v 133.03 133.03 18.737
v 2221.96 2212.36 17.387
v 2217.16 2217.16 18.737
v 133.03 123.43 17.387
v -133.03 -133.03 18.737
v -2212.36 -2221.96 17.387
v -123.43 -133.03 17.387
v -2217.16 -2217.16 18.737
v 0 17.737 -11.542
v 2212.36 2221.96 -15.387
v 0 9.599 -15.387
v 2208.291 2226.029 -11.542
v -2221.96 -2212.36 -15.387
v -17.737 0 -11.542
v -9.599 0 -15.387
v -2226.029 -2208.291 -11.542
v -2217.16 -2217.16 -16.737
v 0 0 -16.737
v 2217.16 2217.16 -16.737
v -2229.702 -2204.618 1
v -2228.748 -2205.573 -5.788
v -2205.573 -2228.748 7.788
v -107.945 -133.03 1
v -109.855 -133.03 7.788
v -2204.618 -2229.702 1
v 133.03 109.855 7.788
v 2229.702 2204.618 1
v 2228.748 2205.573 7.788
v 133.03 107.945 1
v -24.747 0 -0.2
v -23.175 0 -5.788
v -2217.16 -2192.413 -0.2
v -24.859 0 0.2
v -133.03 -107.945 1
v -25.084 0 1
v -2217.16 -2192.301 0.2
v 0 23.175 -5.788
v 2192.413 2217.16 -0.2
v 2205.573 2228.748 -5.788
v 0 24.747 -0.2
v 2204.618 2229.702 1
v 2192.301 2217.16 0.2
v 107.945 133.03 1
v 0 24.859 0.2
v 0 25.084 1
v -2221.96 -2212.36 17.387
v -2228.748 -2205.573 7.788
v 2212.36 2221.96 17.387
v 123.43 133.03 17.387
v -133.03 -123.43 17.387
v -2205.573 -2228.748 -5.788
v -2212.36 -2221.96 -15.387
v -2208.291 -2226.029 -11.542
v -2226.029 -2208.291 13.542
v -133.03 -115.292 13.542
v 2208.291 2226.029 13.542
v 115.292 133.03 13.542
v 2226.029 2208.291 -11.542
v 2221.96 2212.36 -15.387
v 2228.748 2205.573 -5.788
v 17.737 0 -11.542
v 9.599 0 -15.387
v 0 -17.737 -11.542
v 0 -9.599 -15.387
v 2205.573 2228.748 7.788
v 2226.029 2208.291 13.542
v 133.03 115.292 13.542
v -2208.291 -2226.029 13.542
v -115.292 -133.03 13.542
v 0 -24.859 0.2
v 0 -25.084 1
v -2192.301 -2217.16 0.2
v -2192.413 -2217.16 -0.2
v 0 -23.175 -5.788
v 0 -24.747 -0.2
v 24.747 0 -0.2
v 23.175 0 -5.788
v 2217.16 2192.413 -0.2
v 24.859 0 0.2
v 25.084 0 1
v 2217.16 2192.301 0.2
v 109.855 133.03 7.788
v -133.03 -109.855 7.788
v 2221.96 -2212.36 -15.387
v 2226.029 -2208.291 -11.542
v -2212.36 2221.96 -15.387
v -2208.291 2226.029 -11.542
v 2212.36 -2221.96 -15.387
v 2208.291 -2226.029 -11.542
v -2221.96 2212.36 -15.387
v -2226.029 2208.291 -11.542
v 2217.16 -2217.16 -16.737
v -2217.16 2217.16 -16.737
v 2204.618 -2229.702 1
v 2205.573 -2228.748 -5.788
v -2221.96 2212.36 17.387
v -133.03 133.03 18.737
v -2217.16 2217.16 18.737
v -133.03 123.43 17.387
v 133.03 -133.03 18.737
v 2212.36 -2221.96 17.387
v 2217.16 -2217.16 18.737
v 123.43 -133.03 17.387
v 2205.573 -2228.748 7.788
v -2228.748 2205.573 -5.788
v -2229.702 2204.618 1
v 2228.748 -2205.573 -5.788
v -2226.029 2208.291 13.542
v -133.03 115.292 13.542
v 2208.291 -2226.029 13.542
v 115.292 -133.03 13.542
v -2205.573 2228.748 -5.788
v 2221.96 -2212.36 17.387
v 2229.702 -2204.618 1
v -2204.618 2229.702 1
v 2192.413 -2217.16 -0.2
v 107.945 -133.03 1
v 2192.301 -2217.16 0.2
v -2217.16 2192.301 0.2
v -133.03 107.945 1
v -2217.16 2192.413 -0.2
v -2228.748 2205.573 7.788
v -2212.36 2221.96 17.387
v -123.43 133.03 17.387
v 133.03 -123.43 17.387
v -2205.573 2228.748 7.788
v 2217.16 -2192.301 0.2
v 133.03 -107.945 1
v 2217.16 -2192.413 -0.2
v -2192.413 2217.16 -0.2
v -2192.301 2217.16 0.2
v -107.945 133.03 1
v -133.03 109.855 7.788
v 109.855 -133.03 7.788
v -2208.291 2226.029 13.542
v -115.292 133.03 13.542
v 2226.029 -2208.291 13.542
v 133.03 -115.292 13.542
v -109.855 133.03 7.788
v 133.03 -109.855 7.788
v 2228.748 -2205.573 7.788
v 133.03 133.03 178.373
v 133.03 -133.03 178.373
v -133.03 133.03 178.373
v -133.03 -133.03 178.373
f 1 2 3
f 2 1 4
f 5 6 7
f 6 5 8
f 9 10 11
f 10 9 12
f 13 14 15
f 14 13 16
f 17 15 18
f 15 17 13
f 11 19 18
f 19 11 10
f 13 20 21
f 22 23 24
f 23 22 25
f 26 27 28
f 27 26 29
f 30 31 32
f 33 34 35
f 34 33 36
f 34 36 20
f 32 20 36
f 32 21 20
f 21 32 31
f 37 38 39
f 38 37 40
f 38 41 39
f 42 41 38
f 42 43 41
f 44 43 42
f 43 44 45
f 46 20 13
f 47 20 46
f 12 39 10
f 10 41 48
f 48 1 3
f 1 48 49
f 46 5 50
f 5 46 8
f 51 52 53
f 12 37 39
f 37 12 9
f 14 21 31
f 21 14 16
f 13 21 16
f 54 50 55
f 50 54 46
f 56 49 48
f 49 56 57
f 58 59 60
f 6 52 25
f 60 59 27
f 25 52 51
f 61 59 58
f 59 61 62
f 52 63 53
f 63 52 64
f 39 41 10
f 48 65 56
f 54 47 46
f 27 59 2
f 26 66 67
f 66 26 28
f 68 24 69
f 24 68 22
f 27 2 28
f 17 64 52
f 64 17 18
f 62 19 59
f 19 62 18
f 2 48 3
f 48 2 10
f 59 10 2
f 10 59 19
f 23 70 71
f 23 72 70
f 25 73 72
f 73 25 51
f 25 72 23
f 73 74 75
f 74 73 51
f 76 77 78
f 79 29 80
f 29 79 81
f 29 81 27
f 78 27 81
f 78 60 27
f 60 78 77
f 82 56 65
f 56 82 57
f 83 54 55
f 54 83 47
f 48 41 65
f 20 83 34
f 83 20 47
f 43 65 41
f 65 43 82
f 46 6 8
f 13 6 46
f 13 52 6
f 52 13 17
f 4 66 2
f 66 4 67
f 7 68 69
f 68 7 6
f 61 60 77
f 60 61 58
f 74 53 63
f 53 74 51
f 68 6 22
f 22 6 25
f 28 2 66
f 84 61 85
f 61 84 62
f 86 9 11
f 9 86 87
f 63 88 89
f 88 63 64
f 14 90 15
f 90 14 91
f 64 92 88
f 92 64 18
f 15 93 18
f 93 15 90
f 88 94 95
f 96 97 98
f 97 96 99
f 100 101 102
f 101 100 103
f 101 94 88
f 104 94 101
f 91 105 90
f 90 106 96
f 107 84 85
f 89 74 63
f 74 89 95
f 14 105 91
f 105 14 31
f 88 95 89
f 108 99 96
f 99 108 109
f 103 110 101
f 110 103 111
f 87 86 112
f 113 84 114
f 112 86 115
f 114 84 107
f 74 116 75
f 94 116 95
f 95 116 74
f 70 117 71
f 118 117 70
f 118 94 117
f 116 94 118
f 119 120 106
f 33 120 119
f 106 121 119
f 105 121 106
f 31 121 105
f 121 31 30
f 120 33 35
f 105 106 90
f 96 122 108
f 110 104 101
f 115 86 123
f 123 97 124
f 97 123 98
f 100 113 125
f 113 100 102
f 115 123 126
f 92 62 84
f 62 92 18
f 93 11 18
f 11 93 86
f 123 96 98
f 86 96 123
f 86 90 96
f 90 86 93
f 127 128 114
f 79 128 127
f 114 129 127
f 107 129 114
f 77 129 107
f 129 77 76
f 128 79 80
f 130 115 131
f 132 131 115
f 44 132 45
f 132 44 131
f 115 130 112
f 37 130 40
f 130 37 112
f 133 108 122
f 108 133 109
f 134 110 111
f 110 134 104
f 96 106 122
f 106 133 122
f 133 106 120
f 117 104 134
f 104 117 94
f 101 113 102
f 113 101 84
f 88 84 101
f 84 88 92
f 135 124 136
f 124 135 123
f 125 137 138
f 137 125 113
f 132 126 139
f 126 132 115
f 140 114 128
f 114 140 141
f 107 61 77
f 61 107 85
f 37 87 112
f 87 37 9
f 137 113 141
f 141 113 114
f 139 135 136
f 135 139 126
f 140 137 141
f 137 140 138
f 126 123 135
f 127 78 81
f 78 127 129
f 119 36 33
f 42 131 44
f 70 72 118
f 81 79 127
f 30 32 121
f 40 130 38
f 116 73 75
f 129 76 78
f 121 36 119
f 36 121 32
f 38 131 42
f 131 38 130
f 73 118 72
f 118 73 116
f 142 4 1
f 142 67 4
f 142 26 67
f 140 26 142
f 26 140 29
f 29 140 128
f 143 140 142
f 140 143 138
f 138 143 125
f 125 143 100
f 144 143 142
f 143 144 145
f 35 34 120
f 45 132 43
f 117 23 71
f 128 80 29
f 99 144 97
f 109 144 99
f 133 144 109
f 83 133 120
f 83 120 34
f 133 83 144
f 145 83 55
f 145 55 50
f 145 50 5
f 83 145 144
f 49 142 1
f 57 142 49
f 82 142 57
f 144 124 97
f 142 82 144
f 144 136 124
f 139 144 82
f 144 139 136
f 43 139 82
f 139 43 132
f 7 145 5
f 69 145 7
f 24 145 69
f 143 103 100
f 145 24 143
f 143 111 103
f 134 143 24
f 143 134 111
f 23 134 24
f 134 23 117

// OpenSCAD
// Generated by SHIVA-1 cad_generator - parametric OpenSCAD model
// Units: millimetres.
// domain: cosmic_lightsail
// material: Polyimide film (Kapton HN)
scale_note = "1:100 model";
side = 4434.32;
film_t = 0.4;
boom_r = 17.7373;
union() {
  cube([side, side, film_t], center = true);
  for (a = [45, 135]) rotate([0, 0, a]) translate([-side / sqrt(2), 0, 1]) rotate([0, 90, 0]) cylinder(r = boom_r, h = 2 * side / sqrt(2), $fn = 16);
  translate([0, 0, 0.02 * side + 1]) cube([0.06 * side, 0.06 * side, 0.04 * side], center = true);
}
